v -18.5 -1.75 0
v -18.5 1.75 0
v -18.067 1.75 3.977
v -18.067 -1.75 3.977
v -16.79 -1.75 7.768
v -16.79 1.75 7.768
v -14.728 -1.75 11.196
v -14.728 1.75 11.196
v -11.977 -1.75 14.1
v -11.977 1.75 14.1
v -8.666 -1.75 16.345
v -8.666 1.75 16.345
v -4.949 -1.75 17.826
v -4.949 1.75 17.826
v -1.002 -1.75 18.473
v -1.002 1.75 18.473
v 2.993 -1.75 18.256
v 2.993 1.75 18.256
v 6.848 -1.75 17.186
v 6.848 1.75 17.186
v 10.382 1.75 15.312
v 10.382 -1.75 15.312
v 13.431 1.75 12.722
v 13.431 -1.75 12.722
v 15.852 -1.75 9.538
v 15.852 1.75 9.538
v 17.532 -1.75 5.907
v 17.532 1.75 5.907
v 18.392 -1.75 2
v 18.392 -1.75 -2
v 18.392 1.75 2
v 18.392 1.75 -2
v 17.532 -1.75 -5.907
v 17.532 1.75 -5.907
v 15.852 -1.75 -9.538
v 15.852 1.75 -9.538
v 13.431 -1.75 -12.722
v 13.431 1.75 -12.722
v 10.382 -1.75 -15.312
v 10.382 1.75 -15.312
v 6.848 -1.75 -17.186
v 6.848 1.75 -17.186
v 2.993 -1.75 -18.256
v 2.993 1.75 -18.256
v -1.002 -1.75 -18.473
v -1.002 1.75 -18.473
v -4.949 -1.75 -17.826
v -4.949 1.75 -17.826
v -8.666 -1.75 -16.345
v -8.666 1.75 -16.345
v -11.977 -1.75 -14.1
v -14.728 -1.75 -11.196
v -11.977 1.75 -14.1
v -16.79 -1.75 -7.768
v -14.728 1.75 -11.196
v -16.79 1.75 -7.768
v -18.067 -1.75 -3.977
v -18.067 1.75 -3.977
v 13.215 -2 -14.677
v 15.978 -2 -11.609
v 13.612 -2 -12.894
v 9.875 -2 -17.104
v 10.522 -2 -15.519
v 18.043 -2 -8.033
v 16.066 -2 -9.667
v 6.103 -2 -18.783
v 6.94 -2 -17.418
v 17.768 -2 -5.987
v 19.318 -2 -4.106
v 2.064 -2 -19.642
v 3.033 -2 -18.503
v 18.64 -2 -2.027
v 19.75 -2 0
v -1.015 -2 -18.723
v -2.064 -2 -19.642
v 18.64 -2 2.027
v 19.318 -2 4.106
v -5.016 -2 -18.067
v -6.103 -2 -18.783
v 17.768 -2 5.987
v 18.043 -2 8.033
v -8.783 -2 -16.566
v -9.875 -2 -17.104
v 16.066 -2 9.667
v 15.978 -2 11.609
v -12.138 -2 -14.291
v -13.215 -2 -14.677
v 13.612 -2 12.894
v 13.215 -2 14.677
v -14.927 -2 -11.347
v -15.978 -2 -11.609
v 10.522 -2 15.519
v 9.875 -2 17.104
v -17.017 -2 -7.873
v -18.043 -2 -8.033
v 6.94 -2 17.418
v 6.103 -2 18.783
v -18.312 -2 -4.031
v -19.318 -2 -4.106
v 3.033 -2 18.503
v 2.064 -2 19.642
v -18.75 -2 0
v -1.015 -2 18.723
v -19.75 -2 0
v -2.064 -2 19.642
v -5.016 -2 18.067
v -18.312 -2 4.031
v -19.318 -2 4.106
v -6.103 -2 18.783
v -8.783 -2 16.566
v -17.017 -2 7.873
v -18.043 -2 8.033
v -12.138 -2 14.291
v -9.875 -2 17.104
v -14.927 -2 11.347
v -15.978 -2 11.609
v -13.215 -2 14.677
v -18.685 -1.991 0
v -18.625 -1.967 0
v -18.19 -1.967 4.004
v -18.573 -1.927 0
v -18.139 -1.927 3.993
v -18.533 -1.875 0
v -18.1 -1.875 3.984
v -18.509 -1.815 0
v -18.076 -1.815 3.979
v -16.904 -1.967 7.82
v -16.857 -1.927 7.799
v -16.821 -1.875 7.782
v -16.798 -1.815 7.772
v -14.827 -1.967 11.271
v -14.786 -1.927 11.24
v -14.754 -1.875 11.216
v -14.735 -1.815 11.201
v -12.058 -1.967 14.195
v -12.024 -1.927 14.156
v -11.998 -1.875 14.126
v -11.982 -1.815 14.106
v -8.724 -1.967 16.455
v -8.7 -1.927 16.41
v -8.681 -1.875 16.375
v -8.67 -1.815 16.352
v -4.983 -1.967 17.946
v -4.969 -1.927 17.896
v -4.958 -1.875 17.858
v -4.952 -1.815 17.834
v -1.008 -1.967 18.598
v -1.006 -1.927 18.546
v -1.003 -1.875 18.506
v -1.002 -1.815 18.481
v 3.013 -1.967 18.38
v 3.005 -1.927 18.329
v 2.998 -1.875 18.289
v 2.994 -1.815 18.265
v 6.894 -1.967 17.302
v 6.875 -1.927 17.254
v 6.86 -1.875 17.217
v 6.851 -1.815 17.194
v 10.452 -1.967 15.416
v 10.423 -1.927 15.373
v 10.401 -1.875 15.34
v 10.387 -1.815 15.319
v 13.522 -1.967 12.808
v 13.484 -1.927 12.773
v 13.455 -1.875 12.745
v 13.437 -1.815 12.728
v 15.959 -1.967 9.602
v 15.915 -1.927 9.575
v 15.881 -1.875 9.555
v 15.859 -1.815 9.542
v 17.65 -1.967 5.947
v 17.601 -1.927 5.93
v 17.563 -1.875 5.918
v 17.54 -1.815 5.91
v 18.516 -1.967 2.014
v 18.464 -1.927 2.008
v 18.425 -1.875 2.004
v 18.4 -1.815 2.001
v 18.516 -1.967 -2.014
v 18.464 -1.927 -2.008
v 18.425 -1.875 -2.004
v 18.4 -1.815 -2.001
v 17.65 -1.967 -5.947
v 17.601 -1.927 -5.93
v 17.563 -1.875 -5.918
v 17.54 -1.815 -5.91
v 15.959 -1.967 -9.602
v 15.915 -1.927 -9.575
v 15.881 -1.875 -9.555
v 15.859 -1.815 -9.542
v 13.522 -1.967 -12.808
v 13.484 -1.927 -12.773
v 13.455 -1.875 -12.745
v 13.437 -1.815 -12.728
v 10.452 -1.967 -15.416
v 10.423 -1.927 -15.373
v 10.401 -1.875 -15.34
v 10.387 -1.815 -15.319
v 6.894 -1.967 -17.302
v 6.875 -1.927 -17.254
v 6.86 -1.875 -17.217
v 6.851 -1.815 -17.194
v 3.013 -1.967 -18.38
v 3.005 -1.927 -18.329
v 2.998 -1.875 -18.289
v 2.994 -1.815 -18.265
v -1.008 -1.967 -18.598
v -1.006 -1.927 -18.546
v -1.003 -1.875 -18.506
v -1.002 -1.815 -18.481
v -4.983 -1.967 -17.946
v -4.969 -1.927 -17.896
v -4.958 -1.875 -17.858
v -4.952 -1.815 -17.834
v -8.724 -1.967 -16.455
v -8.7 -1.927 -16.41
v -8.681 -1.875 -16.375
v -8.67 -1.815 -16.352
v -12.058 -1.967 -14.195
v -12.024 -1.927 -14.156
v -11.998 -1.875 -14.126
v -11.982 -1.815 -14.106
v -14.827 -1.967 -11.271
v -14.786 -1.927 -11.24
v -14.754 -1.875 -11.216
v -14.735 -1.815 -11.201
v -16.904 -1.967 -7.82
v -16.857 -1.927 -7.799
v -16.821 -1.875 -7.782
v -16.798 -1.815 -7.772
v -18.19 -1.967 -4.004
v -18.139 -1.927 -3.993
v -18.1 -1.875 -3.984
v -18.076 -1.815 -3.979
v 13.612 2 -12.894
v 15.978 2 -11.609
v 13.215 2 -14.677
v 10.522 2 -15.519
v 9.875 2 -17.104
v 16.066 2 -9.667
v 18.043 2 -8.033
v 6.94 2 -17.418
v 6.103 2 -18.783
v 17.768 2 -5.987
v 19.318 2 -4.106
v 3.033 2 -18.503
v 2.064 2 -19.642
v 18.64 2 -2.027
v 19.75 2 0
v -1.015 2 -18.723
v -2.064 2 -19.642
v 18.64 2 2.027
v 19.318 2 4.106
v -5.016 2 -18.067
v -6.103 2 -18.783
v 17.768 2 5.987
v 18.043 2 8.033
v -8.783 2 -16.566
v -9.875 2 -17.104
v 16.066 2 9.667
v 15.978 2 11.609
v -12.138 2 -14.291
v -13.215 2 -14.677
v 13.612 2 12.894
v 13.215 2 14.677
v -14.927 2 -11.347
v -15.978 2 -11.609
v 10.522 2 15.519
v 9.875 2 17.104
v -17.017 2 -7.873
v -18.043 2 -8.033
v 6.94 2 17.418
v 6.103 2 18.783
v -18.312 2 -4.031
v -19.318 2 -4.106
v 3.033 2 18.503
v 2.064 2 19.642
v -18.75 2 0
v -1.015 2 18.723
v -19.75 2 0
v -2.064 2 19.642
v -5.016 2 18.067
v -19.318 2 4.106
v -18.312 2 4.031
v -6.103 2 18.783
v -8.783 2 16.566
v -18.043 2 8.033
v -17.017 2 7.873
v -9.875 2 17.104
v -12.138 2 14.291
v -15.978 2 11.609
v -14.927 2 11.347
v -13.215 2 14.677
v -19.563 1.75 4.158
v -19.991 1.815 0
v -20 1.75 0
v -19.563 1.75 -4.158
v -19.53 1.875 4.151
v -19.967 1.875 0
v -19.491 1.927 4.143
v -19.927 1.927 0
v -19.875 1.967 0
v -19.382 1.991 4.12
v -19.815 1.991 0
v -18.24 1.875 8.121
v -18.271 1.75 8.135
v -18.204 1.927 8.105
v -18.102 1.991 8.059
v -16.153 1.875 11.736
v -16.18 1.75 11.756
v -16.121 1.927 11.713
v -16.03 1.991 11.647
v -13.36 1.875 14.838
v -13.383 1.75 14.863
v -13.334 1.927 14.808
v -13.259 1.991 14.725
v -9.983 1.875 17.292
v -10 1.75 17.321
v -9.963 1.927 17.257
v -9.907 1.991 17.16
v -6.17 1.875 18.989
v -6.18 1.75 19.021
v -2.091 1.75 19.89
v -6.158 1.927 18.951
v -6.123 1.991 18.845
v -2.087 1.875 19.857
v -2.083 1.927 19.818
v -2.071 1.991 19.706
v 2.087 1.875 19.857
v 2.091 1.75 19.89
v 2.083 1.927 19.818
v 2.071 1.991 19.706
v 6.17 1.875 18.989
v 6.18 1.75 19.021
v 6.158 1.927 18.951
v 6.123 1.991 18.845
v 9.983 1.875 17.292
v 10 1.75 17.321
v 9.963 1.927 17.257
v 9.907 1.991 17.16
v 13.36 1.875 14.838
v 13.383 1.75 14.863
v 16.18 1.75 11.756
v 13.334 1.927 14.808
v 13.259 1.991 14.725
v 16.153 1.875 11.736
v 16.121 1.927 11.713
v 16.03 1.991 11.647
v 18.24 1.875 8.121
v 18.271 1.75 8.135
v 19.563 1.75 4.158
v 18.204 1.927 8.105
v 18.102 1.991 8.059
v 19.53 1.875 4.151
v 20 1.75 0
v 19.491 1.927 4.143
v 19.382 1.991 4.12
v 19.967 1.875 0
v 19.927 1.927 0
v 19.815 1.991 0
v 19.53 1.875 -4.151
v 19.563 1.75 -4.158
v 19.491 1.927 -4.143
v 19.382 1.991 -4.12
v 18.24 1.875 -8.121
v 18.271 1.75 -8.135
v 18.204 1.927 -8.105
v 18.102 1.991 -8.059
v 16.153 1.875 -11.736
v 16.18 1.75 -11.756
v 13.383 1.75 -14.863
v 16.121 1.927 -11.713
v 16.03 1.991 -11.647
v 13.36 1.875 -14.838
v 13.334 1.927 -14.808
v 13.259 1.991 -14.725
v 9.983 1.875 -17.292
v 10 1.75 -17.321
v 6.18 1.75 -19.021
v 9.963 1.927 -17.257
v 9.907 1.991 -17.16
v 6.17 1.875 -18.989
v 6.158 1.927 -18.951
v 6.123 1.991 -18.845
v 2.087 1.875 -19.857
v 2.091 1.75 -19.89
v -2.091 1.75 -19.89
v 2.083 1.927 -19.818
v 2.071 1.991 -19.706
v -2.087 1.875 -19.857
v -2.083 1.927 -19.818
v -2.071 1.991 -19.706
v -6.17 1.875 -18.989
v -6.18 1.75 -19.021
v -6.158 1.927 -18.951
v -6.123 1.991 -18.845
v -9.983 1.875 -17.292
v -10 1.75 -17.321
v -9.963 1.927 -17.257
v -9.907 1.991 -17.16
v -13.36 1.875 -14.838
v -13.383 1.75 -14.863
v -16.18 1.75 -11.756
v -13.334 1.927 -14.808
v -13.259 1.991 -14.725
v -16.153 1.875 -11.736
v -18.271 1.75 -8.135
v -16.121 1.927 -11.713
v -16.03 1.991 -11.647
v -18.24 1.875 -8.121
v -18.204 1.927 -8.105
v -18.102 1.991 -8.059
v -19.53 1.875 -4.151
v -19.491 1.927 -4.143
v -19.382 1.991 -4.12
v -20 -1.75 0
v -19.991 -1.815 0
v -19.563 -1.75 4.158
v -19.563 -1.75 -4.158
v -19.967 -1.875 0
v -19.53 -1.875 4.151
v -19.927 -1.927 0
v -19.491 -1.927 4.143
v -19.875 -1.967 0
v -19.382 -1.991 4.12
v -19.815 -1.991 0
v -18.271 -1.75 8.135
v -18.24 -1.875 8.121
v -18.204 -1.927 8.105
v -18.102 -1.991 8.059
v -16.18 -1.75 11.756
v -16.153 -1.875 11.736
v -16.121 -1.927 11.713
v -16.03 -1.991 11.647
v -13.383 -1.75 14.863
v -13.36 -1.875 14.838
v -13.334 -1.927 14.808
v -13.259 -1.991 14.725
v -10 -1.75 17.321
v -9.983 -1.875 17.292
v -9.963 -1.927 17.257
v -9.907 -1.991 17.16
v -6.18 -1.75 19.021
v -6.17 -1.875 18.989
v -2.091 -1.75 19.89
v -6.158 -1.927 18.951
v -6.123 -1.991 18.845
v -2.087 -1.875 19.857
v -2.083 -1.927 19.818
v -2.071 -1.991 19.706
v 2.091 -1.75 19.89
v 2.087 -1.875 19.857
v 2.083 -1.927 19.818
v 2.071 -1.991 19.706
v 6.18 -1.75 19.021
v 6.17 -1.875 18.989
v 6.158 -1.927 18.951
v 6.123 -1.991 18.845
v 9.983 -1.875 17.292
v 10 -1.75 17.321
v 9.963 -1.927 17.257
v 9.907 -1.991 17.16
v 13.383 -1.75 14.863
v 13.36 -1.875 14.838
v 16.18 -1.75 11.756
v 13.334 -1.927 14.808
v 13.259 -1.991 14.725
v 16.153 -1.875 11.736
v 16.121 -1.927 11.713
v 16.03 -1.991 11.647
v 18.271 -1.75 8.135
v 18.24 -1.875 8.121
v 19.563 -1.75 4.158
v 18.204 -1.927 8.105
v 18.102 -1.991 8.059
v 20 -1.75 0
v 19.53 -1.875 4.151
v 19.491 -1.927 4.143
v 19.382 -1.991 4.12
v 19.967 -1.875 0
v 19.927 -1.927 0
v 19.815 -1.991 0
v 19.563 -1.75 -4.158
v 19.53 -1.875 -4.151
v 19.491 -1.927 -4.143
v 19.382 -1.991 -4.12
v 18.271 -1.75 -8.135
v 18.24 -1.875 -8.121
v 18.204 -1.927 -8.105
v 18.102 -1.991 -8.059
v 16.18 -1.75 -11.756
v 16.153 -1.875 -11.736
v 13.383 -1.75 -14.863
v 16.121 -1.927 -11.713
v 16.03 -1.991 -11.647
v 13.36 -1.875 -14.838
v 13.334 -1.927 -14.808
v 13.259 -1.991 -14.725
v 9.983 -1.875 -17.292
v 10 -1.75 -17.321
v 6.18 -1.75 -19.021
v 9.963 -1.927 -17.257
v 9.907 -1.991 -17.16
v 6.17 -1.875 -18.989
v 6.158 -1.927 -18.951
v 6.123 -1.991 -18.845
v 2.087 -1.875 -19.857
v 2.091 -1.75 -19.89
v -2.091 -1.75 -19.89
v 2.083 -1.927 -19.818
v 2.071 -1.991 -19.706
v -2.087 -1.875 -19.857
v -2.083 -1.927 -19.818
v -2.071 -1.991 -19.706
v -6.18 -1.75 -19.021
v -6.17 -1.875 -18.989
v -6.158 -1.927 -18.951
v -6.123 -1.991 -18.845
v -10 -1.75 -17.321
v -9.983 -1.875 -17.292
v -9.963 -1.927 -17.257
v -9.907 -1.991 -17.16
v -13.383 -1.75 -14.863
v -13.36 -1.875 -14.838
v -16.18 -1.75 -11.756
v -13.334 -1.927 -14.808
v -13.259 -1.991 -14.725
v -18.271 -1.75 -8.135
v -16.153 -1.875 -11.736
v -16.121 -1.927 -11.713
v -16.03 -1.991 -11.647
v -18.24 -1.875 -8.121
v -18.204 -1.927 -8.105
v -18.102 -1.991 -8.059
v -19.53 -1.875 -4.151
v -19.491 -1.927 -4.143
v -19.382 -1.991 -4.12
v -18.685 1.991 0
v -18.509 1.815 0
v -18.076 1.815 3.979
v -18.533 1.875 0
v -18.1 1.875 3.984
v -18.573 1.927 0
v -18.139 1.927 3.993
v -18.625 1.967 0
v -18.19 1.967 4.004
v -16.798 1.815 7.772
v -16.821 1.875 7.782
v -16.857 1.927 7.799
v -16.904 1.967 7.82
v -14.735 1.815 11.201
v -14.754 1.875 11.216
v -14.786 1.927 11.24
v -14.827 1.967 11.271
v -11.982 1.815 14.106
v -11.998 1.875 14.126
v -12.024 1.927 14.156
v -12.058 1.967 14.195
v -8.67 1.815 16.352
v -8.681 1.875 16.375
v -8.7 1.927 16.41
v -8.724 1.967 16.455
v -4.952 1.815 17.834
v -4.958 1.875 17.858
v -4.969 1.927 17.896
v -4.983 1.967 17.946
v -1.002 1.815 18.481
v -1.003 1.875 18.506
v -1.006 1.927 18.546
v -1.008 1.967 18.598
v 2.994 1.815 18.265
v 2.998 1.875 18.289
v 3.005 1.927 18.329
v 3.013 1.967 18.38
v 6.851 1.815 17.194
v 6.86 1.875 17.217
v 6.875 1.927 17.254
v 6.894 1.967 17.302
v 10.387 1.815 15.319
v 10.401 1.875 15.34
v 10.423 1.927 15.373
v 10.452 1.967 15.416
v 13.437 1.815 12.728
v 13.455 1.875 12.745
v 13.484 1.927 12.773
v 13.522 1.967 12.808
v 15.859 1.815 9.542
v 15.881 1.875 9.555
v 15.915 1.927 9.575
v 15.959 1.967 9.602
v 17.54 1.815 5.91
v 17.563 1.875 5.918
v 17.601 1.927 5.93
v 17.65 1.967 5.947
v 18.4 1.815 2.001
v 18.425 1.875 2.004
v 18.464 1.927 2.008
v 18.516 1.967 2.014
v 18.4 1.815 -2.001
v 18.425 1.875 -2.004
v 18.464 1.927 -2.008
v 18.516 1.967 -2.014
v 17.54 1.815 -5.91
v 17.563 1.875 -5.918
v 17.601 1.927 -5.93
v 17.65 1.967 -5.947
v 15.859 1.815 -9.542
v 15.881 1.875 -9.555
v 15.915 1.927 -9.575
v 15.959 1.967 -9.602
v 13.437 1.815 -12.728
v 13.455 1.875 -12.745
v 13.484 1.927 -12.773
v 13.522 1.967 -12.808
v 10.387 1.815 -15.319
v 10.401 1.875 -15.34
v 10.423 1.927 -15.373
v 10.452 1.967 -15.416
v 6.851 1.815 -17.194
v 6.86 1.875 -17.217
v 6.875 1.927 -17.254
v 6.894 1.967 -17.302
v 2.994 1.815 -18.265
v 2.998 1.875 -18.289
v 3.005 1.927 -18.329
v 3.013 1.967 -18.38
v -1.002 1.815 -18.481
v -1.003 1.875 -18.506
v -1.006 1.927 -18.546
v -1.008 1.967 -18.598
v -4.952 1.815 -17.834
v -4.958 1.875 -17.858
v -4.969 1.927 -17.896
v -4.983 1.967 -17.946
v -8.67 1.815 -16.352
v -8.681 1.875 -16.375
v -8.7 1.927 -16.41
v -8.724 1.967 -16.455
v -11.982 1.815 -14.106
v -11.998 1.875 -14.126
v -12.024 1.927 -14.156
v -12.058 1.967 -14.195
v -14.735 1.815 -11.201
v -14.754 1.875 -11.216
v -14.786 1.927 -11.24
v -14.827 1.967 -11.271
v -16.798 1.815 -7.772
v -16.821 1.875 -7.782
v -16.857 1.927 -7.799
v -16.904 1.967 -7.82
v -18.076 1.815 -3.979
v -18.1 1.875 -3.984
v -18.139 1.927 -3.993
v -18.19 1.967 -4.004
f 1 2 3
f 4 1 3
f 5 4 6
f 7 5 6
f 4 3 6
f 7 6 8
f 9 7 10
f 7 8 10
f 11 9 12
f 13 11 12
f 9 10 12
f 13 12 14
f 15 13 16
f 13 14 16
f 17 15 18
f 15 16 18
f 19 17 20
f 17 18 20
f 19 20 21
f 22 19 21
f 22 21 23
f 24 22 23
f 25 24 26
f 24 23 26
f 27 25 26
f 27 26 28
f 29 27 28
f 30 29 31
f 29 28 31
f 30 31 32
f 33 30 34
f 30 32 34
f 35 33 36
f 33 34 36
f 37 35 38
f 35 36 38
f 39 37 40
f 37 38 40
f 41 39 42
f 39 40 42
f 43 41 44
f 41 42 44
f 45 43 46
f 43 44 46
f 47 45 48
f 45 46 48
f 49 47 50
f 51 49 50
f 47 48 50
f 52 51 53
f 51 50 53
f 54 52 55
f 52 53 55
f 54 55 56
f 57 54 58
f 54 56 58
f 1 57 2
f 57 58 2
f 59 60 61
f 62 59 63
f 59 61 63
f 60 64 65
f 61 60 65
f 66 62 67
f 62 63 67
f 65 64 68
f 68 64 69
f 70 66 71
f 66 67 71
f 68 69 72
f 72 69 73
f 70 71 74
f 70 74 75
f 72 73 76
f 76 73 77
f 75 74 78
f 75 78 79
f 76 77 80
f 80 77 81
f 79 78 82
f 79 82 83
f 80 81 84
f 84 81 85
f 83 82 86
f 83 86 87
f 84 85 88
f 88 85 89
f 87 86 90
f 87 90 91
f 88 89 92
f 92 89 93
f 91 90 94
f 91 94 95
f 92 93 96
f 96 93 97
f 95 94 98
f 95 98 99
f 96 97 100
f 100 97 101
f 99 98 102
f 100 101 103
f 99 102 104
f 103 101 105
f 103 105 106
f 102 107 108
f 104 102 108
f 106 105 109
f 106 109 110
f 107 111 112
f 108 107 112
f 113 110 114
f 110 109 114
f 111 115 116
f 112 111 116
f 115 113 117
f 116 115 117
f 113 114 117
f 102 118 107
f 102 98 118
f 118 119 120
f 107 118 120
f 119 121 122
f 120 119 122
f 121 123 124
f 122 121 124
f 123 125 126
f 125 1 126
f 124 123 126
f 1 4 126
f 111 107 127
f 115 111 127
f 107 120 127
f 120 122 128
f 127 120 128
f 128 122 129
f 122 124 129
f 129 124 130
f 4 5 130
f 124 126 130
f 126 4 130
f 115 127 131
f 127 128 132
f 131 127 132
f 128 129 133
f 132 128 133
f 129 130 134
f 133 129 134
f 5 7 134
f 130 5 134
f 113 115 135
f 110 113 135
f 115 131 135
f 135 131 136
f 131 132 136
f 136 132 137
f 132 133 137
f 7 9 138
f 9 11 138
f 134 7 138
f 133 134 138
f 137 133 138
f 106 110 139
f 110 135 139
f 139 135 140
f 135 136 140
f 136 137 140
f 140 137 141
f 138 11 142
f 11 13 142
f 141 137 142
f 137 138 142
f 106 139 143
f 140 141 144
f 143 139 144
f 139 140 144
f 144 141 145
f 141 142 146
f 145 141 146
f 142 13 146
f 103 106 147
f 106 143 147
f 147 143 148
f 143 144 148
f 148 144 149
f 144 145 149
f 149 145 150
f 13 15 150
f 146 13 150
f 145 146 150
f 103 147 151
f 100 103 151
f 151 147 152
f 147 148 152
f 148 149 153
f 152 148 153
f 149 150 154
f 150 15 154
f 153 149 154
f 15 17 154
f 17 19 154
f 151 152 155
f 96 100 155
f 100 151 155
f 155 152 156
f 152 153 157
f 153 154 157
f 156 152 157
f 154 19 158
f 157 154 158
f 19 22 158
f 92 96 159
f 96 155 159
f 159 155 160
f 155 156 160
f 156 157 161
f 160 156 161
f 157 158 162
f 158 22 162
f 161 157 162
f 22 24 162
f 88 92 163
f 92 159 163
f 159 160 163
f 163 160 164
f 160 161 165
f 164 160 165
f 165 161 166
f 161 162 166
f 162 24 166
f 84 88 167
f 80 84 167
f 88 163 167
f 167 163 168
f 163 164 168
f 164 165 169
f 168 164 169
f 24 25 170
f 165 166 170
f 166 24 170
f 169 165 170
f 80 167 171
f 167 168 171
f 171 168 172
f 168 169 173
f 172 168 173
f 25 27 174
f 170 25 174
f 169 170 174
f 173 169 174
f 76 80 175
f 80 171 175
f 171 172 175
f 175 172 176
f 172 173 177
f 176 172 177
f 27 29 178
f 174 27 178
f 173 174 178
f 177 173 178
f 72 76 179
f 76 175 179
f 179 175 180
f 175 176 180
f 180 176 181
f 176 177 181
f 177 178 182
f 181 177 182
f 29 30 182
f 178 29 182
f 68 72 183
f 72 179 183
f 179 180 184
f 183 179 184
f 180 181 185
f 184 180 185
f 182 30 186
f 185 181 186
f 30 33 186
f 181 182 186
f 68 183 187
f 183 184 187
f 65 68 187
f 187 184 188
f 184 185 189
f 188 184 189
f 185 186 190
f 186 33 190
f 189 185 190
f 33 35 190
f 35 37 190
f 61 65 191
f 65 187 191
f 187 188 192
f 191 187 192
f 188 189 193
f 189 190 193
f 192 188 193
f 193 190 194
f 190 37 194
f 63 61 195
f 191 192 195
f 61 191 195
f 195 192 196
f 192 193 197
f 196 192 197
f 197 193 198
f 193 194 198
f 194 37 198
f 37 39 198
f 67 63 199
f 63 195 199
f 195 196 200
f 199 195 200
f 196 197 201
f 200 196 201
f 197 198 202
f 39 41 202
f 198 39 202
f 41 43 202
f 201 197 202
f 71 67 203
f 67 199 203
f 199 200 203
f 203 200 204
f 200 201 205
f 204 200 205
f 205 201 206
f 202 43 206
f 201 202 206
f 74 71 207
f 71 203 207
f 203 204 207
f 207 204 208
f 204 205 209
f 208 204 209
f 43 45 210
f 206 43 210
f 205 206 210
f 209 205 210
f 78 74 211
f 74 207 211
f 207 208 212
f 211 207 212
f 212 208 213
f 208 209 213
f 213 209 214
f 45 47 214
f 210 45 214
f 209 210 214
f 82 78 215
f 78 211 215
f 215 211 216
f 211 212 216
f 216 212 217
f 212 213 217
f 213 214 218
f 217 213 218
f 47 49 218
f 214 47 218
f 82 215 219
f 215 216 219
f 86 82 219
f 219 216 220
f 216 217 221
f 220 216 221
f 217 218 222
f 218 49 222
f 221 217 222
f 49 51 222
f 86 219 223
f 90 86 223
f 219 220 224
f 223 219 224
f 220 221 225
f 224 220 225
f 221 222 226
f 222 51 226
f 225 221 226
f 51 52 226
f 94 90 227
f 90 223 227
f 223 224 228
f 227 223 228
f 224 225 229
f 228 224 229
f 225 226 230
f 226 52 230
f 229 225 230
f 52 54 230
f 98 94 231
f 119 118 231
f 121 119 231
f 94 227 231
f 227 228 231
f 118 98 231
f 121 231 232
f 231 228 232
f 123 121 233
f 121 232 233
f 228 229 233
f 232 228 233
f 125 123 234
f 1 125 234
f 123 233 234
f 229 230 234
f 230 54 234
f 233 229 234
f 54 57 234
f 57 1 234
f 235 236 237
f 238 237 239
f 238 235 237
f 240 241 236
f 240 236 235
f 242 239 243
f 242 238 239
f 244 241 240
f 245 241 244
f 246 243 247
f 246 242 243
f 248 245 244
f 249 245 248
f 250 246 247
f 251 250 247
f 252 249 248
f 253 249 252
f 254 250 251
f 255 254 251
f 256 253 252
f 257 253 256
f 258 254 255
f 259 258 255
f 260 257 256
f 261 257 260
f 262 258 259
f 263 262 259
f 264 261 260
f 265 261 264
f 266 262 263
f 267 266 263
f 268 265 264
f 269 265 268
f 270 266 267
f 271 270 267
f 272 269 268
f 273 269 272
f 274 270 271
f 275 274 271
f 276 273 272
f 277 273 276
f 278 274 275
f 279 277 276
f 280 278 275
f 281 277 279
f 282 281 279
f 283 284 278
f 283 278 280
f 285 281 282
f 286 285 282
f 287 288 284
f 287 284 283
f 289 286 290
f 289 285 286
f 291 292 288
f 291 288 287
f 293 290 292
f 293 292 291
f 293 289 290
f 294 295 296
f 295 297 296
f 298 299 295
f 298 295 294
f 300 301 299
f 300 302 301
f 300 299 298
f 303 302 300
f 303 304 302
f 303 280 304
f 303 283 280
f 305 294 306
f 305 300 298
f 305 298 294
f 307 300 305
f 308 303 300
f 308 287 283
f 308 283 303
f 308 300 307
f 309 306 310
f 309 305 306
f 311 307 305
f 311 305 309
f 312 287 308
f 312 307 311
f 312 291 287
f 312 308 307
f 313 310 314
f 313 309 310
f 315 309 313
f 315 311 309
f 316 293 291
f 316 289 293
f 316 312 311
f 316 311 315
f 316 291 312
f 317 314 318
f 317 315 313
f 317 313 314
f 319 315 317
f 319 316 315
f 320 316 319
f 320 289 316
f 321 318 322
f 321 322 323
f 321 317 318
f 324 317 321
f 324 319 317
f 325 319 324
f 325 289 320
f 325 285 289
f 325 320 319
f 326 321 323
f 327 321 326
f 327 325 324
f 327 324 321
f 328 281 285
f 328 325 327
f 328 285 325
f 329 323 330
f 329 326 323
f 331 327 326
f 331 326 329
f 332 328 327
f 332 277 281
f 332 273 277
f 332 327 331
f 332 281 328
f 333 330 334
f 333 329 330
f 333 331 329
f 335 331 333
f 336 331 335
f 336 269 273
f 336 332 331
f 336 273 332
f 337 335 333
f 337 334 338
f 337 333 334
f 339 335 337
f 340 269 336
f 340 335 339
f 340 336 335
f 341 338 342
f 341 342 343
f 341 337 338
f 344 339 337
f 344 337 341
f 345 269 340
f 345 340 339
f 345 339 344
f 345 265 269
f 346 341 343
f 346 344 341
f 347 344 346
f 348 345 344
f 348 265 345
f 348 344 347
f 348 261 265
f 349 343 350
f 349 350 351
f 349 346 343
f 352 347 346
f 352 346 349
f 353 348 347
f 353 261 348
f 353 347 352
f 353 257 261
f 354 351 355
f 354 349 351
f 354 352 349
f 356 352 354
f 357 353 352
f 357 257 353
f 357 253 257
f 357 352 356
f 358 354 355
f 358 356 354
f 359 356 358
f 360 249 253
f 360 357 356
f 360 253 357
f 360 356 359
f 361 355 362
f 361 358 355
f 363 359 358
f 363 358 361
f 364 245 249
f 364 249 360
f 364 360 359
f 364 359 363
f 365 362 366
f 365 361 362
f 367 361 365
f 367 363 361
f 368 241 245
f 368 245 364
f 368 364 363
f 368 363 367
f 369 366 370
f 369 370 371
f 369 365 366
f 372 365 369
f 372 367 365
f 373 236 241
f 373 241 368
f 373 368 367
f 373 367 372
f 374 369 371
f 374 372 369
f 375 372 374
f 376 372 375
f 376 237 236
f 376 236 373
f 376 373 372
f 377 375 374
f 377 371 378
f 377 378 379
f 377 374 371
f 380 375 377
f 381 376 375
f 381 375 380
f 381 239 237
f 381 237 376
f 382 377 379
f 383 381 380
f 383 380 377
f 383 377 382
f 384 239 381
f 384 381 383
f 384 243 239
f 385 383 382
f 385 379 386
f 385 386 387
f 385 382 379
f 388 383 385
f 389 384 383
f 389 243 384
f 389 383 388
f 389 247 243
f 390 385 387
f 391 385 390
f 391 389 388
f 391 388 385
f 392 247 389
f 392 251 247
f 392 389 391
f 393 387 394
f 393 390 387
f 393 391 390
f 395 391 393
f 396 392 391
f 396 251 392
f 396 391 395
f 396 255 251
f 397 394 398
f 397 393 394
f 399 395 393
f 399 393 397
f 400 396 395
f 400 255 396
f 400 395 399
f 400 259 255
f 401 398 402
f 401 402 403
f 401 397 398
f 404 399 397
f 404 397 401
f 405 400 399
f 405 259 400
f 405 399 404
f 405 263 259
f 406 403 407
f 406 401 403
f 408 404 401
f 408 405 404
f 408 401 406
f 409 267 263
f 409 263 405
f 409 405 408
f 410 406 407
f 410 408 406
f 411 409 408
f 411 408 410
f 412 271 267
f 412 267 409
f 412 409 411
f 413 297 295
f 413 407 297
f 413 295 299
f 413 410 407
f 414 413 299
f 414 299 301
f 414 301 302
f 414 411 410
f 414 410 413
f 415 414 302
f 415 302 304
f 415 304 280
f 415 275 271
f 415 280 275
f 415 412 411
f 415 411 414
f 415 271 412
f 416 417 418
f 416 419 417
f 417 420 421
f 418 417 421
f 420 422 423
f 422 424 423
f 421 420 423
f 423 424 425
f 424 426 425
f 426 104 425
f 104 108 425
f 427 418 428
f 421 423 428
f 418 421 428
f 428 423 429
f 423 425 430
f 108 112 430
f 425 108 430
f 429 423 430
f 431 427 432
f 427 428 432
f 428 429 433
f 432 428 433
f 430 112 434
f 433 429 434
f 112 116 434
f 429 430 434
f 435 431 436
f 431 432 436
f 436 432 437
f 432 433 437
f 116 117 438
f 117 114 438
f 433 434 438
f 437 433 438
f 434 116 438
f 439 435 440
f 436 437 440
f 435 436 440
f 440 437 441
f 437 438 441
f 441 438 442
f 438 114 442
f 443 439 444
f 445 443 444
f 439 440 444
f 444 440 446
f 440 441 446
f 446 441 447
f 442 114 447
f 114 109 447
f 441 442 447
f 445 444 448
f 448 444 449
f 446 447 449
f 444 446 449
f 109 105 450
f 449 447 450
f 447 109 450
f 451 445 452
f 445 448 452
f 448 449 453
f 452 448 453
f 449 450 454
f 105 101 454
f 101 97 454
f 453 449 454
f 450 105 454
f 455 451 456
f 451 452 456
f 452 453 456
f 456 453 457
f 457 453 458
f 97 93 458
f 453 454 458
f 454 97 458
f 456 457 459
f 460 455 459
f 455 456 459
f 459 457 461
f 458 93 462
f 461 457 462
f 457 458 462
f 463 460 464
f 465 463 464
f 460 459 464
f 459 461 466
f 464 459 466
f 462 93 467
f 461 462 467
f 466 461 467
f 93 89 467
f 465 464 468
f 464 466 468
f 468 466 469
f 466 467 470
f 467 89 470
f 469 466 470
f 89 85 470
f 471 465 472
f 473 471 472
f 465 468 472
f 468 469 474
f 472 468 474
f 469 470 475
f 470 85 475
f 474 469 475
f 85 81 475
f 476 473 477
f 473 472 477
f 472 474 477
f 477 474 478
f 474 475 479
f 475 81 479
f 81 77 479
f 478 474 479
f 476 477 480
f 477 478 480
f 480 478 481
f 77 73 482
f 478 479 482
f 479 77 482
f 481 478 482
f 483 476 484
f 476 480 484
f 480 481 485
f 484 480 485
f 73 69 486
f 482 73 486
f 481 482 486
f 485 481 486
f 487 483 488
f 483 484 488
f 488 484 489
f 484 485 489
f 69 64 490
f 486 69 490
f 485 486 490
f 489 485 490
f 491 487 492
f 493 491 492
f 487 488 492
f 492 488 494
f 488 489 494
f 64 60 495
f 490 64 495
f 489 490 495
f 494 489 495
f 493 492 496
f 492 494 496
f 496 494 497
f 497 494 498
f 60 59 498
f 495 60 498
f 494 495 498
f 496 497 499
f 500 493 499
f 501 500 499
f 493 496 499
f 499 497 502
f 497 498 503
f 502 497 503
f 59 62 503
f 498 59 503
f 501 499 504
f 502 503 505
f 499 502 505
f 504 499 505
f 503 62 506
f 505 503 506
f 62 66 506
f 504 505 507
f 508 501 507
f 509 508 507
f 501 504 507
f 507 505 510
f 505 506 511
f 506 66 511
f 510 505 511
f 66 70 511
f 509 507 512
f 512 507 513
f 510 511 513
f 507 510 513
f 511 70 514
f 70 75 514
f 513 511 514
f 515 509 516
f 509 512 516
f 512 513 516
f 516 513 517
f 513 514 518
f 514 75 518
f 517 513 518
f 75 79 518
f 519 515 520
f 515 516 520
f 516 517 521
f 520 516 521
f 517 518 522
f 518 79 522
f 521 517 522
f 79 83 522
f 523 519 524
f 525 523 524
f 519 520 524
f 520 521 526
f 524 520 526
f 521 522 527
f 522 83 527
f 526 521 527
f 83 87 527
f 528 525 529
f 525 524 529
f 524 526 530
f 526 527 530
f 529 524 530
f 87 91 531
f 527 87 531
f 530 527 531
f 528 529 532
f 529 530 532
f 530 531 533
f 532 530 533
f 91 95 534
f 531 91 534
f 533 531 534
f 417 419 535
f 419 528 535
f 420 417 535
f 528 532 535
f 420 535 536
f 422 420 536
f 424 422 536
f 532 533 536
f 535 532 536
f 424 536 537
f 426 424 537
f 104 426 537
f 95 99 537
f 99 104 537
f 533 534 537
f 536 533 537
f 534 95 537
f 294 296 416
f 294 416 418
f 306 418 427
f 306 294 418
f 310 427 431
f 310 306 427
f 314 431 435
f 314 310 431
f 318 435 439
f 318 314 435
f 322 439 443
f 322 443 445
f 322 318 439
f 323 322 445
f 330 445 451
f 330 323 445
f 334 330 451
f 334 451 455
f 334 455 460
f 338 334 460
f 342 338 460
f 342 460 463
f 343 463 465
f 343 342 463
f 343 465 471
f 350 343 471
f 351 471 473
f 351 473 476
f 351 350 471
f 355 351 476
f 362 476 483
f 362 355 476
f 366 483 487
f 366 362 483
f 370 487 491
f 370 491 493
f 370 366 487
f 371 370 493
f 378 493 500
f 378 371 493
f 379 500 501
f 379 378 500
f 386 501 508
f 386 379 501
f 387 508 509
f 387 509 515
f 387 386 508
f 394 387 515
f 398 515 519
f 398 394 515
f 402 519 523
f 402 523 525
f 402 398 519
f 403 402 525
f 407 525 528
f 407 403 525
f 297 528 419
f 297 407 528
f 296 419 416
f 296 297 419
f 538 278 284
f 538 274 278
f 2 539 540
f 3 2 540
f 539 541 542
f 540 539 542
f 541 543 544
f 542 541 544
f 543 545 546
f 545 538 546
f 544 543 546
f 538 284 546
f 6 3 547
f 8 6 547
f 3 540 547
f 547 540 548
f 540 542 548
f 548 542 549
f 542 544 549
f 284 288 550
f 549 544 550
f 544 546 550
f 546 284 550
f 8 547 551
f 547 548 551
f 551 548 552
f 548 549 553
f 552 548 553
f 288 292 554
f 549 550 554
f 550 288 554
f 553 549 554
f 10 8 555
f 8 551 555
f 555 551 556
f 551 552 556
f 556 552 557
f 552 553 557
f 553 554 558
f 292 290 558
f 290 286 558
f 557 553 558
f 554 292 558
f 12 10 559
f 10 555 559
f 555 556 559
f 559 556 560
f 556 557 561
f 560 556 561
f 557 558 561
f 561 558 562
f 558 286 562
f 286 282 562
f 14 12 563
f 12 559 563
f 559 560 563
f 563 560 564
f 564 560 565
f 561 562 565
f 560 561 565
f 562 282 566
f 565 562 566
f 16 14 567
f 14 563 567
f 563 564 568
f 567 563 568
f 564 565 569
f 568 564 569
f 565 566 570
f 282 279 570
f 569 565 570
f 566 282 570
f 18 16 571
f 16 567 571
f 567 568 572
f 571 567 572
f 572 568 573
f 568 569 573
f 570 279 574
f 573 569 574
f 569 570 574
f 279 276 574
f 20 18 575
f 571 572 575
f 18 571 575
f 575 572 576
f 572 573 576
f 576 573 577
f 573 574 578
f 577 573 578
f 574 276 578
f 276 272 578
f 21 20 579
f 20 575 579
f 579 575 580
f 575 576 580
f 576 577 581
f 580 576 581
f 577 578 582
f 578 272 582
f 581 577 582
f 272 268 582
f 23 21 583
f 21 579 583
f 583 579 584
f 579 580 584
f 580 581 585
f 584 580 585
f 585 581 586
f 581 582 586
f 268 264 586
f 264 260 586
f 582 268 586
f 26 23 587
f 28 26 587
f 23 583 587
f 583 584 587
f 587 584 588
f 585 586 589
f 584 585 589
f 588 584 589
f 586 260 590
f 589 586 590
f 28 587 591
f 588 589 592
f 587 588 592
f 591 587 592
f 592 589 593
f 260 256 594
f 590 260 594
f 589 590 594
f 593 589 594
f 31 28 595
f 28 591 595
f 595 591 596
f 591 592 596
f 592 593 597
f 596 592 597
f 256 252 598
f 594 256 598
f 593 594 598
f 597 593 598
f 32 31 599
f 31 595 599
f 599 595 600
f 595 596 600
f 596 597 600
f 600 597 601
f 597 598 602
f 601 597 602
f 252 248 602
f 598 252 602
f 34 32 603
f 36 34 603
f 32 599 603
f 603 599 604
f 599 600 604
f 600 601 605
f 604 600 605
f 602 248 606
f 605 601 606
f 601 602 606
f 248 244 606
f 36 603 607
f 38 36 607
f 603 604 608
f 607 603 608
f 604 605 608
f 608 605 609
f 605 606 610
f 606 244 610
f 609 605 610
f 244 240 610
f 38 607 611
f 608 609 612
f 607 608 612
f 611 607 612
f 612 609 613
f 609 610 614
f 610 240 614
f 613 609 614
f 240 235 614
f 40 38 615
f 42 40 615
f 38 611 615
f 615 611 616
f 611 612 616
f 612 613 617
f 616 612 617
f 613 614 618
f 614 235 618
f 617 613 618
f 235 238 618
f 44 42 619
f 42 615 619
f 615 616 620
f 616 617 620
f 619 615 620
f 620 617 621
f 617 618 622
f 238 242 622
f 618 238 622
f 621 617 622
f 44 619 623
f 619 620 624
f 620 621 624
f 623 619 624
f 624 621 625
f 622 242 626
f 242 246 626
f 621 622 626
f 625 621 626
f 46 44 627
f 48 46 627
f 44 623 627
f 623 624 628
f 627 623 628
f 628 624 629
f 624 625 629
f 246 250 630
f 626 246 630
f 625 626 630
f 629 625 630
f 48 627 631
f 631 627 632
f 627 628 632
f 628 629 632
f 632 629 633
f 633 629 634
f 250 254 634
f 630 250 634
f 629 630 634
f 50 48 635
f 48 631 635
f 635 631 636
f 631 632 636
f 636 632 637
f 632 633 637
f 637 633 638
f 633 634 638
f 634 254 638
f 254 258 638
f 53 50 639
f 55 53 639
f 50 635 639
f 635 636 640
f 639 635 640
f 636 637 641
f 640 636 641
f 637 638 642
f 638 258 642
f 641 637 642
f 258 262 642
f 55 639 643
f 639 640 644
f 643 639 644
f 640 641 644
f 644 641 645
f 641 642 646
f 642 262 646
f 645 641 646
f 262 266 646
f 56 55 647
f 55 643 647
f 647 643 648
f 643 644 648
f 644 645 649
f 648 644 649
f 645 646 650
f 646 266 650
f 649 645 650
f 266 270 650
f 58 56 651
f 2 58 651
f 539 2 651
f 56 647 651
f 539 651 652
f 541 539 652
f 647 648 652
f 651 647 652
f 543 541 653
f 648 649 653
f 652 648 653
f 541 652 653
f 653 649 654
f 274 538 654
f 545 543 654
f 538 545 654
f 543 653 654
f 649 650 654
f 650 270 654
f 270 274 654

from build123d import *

# Parameters (mm, degrees)
SKETCH1_W = 1.5
SKETCH1_H = 4
FILLET1_R = 0.25


with BuildPart() as part:
    # Sketch1 → Revolve1 (revolve)
    with BuildSketch(Plane.XY):
        with Locations((-19.25, 0)):
            Rectangle(SKETCH1_W, SKETCH1_H)
    revolve(axis=Axis((0, 0, 0), (0, 1, 0)))

    # Fillet1
    fillet1_edges = [part.edges().sort_by_distance(p)[0] for p in [
        (20, 2, 0),
        (18.5, 2, 0),
        (18.5, -2, 0),
        (20, -2, 0),
    ]]
    fillet(fillet1_edges, radius=FILLET1_R)


solid = part.part
